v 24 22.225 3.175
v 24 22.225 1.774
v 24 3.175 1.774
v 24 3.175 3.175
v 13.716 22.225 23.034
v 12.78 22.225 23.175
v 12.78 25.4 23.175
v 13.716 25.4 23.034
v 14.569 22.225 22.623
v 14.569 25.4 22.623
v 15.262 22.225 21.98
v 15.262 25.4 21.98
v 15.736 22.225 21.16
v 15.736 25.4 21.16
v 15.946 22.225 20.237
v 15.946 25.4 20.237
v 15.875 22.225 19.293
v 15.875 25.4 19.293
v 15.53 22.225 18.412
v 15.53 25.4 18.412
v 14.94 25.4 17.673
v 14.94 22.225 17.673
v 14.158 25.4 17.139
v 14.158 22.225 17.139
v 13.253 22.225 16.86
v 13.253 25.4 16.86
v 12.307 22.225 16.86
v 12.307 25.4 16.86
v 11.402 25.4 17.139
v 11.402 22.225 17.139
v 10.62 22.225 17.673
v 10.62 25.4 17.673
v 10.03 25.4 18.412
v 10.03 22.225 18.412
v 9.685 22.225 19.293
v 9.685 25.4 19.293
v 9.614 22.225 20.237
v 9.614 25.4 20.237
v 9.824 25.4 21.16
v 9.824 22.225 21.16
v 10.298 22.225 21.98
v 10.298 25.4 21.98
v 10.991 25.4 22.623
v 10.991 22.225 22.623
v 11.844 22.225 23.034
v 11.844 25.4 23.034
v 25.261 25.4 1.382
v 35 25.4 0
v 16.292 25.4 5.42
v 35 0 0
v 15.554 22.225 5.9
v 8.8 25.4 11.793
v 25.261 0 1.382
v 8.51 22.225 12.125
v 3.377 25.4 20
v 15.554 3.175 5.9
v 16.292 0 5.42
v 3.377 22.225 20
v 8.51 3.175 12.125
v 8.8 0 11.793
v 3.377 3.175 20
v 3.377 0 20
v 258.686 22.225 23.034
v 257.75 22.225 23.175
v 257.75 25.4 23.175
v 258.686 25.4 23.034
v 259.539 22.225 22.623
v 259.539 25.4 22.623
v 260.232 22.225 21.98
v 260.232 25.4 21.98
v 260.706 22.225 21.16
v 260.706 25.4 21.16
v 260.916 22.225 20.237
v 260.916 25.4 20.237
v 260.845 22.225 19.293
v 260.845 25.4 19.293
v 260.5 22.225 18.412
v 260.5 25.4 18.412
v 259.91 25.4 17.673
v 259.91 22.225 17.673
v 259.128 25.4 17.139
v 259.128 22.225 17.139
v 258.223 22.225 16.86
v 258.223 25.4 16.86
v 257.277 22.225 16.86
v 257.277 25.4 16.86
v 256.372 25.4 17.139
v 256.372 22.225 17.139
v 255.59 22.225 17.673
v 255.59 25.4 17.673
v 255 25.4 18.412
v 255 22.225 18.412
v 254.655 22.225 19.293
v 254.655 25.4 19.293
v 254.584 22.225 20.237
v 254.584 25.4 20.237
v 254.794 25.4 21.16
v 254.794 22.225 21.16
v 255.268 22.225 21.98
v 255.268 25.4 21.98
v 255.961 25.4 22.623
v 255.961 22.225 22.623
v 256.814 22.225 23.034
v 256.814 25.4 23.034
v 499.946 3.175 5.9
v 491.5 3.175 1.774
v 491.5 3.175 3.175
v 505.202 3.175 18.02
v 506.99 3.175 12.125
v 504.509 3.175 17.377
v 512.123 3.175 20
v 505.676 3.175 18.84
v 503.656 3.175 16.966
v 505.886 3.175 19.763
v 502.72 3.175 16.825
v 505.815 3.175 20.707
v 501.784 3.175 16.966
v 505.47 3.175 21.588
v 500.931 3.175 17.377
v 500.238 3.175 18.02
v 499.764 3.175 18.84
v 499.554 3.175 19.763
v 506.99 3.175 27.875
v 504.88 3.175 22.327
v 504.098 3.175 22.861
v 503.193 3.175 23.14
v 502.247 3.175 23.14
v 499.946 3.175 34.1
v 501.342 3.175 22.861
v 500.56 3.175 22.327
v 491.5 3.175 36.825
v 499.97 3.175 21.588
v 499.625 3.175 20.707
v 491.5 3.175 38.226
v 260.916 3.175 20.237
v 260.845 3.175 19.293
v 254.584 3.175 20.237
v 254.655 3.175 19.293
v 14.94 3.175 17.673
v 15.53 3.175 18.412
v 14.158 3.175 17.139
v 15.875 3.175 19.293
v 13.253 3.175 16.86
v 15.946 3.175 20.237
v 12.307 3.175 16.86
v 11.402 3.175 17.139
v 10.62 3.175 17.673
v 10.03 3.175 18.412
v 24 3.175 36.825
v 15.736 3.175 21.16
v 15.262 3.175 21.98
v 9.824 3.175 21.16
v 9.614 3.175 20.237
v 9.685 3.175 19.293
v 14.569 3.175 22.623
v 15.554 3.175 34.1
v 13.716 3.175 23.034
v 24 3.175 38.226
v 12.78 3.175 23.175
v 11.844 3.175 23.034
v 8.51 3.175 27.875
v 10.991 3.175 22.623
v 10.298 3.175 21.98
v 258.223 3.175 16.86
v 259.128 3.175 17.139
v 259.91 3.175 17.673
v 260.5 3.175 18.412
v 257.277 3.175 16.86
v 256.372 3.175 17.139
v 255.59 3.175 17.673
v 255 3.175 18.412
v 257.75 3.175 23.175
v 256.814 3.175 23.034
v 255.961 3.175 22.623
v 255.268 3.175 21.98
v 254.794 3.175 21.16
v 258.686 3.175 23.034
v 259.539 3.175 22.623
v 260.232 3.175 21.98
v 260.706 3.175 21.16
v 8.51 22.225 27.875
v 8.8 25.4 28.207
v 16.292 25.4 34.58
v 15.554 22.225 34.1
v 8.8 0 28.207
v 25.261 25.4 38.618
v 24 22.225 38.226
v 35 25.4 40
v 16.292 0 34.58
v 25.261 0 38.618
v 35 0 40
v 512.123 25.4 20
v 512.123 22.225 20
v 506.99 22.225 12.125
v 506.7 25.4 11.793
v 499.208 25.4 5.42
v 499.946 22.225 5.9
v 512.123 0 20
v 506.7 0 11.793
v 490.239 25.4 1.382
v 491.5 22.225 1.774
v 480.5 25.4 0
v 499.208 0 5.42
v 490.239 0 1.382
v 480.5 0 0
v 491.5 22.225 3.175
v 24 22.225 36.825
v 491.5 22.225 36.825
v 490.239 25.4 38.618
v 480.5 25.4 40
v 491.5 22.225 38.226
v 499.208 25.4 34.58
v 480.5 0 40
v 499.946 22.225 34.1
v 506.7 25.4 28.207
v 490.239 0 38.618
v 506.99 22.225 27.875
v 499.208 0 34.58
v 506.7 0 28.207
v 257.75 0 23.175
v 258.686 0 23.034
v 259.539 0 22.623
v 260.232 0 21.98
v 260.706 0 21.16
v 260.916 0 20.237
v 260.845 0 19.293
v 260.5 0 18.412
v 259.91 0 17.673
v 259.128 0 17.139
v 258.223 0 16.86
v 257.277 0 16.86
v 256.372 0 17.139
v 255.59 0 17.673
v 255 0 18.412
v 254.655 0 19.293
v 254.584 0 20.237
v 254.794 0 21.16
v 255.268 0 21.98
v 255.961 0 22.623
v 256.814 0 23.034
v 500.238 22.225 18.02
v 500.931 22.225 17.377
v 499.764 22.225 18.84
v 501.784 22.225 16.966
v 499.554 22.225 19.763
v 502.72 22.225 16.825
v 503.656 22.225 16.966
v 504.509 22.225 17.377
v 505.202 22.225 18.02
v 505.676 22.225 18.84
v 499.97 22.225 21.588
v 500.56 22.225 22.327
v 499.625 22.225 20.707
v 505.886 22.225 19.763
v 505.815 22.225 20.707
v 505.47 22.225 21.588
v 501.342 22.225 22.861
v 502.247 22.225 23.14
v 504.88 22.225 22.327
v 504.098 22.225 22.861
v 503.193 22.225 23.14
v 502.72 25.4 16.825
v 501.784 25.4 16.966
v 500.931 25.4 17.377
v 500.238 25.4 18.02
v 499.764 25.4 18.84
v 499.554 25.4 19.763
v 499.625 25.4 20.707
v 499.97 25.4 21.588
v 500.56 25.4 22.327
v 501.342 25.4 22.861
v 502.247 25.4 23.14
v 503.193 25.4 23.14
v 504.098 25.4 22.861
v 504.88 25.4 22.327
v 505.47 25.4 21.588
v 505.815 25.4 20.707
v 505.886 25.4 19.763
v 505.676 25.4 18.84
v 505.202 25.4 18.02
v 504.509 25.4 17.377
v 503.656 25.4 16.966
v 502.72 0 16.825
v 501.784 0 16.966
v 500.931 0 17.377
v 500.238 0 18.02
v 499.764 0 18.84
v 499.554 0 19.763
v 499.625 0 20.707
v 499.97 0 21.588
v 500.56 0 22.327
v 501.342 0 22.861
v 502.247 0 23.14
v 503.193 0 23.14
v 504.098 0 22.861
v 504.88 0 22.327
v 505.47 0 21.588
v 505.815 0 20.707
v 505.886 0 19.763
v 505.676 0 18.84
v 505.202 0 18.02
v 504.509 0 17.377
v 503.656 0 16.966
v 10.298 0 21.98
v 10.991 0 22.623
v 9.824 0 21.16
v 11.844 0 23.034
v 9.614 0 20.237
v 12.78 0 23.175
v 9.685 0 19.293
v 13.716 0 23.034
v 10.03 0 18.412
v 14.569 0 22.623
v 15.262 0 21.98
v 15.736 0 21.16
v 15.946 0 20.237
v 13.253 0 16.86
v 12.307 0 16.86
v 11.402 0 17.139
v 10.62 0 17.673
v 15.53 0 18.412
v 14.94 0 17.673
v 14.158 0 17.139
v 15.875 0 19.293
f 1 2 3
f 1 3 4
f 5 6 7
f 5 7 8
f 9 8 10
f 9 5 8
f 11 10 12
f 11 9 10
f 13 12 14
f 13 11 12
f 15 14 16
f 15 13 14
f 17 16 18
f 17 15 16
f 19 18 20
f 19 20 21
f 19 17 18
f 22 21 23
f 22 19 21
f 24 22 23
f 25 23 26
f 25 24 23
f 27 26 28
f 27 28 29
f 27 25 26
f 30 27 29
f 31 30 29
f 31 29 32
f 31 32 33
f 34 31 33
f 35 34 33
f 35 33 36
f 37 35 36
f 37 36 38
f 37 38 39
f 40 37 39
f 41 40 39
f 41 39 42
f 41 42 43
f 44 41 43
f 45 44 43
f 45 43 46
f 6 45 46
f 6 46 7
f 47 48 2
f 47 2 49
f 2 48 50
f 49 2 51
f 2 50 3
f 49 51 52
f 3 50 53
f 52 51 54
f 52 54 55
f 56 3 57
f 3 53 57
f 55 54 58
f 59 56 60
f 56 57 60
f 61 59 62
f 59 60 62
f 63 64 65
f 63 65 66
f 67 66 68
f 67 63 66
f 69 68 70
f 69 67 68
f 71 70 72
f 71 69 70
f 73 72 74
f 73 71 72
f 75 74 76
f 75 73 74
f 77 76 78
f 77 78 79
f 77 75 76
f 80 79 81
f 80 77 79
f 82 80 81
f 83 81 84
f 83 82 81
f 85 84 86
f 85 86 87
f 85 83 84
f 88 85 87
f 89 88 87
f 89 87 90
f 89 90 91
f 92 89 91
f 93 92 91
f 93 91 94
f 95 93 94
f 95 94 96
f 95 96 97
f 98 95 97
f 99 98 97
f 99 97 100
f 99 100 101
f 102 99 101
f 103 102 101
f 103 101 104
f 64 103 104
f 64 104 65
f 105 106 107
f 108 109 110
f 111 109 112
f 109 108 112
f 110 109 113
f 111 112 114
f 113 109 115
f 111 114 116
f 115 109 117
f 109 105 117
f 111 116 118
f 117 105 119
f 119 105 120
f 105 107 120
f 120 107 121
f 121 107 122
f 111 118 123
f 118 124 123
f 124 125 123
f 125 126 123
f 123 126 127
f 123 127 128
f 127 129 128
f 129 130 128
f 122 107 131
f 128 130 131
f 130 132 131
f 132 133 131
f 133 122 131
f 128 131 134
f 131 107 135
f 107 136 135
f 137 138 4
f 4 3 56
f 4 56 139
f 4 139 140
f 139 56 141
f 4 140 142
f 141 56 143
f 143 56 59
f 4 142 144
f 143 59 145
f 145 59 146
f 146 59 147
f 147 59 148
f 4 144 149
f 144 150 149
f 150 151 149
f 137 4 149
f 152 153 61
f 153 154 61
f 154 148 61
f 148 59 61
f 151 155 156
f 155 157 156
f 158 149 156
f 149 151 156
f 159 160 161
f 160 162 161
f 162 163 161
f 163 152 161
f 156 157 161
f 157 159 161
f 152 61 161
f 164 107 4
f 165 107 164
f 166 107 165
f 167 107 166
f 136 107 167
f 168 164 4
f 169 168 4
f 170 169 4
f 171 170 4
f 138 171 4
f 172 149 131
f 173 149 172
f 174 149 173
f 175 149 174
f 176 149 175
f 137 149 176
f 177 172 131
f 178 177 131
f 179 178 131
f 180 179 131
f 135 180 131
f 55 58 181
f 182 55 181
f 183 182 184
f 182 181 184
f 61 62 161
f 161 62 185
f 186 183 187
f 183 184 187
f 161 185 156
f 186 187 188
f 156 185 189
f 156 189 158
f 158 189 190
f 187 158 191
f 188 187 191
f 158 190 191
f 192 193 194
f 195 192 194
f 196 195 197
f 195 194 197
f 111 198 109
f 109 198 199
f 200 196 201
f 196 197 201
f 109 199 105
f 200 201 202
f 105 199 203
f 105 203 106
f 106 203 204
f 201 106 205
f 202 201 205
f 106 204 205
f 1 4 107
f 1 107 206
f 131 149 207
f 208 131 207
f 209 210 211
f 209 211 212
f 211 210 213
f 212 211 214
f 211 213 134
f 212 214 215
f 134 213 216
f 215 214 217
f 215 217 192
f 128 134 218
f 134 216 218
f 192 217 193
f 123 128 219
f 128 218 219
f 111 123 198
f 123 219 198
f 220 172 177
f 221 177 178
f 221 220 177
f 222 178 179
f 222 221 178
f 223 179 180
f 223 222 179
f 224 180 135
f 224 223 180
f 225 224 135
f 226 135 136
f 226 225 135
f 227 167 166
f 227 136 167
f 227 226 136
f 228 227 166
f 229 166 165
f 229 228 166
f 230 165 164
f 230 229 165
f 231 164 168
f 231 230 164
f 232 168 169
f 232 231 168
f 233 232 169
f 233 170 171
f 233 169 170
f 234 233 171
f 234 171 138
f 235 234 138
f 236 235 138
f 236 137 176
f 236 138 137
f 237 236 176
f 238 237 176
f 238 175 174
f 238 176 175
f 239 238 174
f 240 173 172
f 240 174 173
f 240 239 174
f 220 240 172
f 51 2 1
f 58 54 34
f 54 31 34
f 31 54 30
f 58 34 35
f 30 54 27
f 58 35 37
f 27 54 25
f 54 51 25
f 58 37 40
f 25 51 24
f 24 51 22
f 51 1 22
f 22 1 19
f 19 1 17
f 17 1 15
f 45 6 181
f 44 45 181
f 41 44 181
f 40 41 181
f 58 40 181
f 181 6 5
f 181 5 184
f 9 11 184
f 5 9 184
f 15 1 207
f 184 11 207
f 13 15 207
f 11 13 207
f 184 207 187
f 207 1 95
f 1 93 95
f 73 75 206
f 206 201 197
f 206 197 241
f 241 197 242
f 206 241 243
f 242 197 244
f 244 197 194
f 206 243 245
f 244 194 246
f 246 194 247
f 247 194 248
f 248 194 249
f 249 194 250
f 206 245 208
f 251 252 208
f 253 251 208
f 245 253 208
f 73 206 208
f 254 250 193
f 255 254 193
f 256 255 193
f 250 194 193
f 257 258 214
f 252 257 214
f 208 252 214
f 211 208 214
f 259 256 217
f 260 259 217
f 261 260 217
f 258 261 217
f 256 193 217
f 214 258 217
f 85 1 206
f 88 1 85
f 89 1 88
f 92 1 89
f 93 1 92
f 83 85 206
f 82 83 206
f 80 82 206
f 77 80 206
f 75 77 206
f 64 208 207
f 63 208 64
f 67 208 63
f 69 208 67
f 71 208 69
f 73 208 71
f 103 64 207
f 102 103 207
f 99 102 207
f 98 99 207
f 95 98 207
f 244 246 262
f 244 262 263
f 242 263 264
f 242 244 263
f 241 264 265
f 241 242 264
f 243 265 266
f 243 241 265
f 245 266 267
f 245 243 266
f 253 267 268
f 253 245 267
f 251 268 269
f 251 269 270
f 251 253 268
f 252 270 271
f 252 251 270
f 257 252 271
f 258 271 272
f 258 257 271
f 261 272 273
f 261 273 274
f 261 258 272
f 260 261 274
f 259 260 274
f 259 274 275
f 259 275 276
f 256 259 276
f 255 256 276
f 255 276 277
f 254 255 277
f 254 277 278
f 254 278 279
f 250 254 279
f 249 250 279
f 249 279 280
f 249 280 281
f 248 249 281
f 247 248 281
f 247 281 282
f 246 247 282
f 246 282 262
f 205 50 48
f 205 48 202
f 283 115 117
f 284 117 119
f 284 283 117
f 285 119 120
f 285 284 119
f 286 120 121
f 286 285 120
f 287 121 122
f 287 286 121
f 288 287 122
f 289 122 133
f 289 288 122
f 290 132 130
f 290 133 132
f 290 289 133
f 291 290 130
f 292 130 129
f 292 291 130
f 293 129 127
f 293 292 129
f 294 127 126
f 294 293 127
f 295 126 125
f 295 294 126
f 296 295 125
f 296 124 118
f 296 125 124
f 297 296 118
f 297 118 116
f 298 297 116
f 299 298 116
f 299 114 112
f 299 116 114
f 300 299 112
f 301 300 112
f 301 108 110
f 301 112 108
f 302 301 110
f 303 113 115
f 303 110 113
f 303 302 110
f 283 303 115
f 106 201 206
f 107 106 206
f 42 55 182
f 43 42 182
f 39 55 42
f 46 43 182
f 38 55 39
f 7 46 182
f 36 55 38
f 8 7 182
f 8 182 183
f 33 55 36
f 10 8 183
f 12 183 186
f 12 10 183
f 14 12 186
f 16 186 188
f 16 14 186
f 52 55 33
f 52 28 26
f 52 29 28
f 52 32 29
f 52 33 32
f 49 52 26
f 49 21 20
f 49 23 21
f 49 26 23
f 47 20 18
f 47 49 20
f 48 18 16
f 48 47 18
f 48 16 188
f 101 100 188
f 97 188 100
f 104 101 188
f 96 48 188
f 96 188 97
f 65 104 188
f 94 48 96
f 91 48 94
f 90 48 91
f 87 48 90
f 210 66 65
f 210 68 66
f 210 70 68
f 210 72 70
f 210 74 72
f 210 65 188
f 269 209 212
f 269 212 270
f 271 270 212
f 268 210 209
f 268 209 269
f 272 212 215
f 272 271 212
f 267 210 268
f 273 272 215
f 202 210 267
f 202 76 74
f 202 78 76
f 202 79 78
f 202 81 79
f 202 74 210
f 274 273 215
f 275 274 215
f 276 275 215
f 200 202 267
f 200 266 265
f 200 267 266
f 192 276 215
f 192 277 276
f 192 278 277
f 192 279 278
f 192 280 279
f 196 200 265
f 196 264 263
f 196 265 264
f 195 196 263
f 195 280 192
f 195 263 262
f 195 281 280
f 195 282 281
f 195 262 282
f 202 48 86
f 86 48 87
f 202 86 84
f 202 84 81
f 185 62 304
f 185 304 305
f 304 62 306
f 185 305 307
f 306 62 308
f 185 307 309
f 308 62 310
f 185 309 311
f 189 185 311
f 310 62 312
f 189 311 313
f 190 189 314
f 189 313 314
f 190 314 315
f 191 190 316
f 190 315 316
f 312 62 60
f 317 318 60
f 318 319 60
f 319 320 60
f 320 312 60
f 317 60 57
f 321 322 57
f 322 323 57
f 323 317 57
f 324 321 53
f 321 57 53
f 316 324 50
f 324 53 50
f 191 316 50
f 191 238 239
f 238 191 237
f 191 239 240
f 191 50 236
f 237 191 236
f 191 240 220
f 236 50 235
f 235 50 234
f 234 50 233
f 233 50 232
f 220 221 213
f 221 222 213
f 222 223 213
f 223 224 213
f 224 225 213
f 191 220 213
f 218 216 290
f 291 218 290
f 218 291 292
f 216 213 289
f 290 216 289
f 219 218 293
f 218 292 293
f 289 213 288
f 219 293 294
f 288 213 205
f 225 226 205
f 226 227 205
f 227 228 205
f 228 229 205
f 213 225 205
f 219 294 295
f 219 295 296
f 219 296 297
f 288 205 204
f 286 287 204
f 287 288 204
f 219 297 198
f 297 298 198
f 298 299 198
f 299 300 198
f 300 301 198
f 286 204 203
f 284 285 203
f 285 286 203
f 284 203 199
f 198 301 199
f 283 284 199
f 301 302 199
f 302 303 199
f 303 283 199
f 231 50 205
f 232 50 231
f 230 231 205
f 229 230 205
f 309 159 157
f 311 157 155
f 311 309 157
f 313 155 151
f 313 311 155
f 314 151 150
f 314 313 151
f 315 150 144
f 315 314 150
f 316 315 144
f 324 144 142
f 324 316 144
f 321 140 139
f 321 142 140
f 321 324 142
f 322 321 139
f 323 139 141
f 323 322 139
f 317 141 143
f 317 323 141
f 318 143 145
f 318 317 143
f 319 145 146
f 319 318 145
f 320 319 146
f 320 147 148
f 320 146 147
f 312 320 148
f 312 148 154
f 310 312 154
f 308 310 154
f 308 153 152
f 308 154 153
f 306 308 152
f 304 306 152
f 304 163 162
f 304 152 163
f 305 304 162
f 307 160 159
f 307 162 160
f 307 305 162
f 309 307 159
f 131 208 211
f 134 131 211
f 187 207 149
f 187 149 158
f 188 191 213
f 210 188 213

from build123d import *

# Parameters (mm, degrees)
SKETCH1_W           = 515.5
SKETCH1_H           = 40
SKETCH1_R           = 3.175
BOSS_EXTRUDE1_DEPTH = 25.4
CUT_EXTRUDE1_REACH  = 519.673
SKETCH2_W           = 33.65
SKETCH2_H           = 19.05
SKETCH4_W           = 40
SKETCH4_H           = 19.05
CUT_EXTRUDE2_DEPTH  = 24
FILLET1_R           = 35


with BuildPart() as part:
    # Sketch1 → Boss-Extrude1 (new body)
    with BuildSketch(Plane(origin=(0, 0, 0), x_dir=(1, 0, 0), z_dir=(0, 1, 0))):
        with Locations((257.75, -20)):
            Rectangle(SKETCH1_W, SKETCH1_H)
        with Locations(Location((257.75, -20, 0), (0, 0, 270))):
            Circle(SKETCH1_R, mode=Mode.SUBTRACT)
        with Locations(Location((12.78, -20, 0), (0, 0, 270))):
            Circle(SKETCH1_R, mode=Mode.SUBTRACT)
        with Locations(Location((502.72, -20, 0), (0, 0, 90))):
            Circle(SKETCH1_R, mode=Mode.SUBTRACT)
    extrude(amount=BOSS_EXTRUDE1_DEPTH)

    # Cut-Extrude1: up to this face of the body (flat: up to its plane)
    cut_extrude1_end = Plane(part.part.faces().sort_by_distance((515.5, 12.7, 20))[0])
    # Sketch2 → Cut-Extrude1 (cut, up to the picked face)
    with BuildSketch(Plane.ZY, mode=Mode.PRIVATE) as cut_extrude1_sk1:
        with Locations((20, 12.7)):
            Rectangle(SKETCH2_W, SKETCH2_H)
    cut_extrude1_tool1 = split(extrude(cut_extrude1_sk1.sketch, amount=-CUT_EXTRUDE1_REACH, mode=Mode.PRIVATE), bisect_by=cut_extrude1_end, keep=Keep.BOTH, mode=Mode.PRIVATE)
    add(cut_extrude1_tool1.solids().sort_by(Axis((0, 12.7, 20), (1, 0, 0)))[0], mode=Mode.SUBTRACT)

    # Sketch4 → Cut-Extrude2 (cut)
    with BuildSketch(Plane.ZY):
        with Locations((20, 12.7)):
            Rectangle(SKETCH4_W, SKETCH4_H)
    cut_extrude2 = extrude(amount=-CUT_EXTRUDE2_DEPTH, mode=Mode.SUBTRACT)

    # Mirror1: Cut-Extrude2 across plane
    add(cut_extrude2.mirror(Plane.ZY.offset(-257.75)), mode=Mode.SUBTRACT)

    # Fillet1
    # the kernel refuses this fillet: 35 mm, written as the material it takes off along each edge
    with BuildSketch(Plane(origin=(515.5, -65.275, 0), x_dir=(-1, 0, 0), z_dir=(0, 1, 0)), Plane(origin=(0, -65.275, 40), x_dir=(1, 0, 0), z_dir=(0, 1, 0))) as fillet1_piece_1:
        with BuildLine():
            CenterArc((FILLET1_R, FILLET1_R), FILLET1_R, 180, 90)
            Line((0, FILLET1_R), (0, 0))
            Line((0, 0), (FILLET1_R, 0))
        make_face()
    extrude(amount=178.175, mode=Mode.SUBTRACT)
    with BuildSketch(Plane(origin=(515.5, -65.275, 40), x_dir=(-1, 0, 0), z_dir=(0, 1, 0)), Plane(origin=(0, -65.275, 0), x_dir=(1, 0, 0), z_dir=(0, 1, 0))) as fillet1_piece_2:
        with BuildLine():
            CenterArc((FILLET1_R, -FILLET1_R), FILLET1_R, 90, 90)
            Line((0, -FILLET1_R), (0, 0))
            Line((0, 0), (FILLET1_R, 0))
        make_face()
    extrude(amount=178.175, mode=Mode.SUBTRACT)


solid = part.part
